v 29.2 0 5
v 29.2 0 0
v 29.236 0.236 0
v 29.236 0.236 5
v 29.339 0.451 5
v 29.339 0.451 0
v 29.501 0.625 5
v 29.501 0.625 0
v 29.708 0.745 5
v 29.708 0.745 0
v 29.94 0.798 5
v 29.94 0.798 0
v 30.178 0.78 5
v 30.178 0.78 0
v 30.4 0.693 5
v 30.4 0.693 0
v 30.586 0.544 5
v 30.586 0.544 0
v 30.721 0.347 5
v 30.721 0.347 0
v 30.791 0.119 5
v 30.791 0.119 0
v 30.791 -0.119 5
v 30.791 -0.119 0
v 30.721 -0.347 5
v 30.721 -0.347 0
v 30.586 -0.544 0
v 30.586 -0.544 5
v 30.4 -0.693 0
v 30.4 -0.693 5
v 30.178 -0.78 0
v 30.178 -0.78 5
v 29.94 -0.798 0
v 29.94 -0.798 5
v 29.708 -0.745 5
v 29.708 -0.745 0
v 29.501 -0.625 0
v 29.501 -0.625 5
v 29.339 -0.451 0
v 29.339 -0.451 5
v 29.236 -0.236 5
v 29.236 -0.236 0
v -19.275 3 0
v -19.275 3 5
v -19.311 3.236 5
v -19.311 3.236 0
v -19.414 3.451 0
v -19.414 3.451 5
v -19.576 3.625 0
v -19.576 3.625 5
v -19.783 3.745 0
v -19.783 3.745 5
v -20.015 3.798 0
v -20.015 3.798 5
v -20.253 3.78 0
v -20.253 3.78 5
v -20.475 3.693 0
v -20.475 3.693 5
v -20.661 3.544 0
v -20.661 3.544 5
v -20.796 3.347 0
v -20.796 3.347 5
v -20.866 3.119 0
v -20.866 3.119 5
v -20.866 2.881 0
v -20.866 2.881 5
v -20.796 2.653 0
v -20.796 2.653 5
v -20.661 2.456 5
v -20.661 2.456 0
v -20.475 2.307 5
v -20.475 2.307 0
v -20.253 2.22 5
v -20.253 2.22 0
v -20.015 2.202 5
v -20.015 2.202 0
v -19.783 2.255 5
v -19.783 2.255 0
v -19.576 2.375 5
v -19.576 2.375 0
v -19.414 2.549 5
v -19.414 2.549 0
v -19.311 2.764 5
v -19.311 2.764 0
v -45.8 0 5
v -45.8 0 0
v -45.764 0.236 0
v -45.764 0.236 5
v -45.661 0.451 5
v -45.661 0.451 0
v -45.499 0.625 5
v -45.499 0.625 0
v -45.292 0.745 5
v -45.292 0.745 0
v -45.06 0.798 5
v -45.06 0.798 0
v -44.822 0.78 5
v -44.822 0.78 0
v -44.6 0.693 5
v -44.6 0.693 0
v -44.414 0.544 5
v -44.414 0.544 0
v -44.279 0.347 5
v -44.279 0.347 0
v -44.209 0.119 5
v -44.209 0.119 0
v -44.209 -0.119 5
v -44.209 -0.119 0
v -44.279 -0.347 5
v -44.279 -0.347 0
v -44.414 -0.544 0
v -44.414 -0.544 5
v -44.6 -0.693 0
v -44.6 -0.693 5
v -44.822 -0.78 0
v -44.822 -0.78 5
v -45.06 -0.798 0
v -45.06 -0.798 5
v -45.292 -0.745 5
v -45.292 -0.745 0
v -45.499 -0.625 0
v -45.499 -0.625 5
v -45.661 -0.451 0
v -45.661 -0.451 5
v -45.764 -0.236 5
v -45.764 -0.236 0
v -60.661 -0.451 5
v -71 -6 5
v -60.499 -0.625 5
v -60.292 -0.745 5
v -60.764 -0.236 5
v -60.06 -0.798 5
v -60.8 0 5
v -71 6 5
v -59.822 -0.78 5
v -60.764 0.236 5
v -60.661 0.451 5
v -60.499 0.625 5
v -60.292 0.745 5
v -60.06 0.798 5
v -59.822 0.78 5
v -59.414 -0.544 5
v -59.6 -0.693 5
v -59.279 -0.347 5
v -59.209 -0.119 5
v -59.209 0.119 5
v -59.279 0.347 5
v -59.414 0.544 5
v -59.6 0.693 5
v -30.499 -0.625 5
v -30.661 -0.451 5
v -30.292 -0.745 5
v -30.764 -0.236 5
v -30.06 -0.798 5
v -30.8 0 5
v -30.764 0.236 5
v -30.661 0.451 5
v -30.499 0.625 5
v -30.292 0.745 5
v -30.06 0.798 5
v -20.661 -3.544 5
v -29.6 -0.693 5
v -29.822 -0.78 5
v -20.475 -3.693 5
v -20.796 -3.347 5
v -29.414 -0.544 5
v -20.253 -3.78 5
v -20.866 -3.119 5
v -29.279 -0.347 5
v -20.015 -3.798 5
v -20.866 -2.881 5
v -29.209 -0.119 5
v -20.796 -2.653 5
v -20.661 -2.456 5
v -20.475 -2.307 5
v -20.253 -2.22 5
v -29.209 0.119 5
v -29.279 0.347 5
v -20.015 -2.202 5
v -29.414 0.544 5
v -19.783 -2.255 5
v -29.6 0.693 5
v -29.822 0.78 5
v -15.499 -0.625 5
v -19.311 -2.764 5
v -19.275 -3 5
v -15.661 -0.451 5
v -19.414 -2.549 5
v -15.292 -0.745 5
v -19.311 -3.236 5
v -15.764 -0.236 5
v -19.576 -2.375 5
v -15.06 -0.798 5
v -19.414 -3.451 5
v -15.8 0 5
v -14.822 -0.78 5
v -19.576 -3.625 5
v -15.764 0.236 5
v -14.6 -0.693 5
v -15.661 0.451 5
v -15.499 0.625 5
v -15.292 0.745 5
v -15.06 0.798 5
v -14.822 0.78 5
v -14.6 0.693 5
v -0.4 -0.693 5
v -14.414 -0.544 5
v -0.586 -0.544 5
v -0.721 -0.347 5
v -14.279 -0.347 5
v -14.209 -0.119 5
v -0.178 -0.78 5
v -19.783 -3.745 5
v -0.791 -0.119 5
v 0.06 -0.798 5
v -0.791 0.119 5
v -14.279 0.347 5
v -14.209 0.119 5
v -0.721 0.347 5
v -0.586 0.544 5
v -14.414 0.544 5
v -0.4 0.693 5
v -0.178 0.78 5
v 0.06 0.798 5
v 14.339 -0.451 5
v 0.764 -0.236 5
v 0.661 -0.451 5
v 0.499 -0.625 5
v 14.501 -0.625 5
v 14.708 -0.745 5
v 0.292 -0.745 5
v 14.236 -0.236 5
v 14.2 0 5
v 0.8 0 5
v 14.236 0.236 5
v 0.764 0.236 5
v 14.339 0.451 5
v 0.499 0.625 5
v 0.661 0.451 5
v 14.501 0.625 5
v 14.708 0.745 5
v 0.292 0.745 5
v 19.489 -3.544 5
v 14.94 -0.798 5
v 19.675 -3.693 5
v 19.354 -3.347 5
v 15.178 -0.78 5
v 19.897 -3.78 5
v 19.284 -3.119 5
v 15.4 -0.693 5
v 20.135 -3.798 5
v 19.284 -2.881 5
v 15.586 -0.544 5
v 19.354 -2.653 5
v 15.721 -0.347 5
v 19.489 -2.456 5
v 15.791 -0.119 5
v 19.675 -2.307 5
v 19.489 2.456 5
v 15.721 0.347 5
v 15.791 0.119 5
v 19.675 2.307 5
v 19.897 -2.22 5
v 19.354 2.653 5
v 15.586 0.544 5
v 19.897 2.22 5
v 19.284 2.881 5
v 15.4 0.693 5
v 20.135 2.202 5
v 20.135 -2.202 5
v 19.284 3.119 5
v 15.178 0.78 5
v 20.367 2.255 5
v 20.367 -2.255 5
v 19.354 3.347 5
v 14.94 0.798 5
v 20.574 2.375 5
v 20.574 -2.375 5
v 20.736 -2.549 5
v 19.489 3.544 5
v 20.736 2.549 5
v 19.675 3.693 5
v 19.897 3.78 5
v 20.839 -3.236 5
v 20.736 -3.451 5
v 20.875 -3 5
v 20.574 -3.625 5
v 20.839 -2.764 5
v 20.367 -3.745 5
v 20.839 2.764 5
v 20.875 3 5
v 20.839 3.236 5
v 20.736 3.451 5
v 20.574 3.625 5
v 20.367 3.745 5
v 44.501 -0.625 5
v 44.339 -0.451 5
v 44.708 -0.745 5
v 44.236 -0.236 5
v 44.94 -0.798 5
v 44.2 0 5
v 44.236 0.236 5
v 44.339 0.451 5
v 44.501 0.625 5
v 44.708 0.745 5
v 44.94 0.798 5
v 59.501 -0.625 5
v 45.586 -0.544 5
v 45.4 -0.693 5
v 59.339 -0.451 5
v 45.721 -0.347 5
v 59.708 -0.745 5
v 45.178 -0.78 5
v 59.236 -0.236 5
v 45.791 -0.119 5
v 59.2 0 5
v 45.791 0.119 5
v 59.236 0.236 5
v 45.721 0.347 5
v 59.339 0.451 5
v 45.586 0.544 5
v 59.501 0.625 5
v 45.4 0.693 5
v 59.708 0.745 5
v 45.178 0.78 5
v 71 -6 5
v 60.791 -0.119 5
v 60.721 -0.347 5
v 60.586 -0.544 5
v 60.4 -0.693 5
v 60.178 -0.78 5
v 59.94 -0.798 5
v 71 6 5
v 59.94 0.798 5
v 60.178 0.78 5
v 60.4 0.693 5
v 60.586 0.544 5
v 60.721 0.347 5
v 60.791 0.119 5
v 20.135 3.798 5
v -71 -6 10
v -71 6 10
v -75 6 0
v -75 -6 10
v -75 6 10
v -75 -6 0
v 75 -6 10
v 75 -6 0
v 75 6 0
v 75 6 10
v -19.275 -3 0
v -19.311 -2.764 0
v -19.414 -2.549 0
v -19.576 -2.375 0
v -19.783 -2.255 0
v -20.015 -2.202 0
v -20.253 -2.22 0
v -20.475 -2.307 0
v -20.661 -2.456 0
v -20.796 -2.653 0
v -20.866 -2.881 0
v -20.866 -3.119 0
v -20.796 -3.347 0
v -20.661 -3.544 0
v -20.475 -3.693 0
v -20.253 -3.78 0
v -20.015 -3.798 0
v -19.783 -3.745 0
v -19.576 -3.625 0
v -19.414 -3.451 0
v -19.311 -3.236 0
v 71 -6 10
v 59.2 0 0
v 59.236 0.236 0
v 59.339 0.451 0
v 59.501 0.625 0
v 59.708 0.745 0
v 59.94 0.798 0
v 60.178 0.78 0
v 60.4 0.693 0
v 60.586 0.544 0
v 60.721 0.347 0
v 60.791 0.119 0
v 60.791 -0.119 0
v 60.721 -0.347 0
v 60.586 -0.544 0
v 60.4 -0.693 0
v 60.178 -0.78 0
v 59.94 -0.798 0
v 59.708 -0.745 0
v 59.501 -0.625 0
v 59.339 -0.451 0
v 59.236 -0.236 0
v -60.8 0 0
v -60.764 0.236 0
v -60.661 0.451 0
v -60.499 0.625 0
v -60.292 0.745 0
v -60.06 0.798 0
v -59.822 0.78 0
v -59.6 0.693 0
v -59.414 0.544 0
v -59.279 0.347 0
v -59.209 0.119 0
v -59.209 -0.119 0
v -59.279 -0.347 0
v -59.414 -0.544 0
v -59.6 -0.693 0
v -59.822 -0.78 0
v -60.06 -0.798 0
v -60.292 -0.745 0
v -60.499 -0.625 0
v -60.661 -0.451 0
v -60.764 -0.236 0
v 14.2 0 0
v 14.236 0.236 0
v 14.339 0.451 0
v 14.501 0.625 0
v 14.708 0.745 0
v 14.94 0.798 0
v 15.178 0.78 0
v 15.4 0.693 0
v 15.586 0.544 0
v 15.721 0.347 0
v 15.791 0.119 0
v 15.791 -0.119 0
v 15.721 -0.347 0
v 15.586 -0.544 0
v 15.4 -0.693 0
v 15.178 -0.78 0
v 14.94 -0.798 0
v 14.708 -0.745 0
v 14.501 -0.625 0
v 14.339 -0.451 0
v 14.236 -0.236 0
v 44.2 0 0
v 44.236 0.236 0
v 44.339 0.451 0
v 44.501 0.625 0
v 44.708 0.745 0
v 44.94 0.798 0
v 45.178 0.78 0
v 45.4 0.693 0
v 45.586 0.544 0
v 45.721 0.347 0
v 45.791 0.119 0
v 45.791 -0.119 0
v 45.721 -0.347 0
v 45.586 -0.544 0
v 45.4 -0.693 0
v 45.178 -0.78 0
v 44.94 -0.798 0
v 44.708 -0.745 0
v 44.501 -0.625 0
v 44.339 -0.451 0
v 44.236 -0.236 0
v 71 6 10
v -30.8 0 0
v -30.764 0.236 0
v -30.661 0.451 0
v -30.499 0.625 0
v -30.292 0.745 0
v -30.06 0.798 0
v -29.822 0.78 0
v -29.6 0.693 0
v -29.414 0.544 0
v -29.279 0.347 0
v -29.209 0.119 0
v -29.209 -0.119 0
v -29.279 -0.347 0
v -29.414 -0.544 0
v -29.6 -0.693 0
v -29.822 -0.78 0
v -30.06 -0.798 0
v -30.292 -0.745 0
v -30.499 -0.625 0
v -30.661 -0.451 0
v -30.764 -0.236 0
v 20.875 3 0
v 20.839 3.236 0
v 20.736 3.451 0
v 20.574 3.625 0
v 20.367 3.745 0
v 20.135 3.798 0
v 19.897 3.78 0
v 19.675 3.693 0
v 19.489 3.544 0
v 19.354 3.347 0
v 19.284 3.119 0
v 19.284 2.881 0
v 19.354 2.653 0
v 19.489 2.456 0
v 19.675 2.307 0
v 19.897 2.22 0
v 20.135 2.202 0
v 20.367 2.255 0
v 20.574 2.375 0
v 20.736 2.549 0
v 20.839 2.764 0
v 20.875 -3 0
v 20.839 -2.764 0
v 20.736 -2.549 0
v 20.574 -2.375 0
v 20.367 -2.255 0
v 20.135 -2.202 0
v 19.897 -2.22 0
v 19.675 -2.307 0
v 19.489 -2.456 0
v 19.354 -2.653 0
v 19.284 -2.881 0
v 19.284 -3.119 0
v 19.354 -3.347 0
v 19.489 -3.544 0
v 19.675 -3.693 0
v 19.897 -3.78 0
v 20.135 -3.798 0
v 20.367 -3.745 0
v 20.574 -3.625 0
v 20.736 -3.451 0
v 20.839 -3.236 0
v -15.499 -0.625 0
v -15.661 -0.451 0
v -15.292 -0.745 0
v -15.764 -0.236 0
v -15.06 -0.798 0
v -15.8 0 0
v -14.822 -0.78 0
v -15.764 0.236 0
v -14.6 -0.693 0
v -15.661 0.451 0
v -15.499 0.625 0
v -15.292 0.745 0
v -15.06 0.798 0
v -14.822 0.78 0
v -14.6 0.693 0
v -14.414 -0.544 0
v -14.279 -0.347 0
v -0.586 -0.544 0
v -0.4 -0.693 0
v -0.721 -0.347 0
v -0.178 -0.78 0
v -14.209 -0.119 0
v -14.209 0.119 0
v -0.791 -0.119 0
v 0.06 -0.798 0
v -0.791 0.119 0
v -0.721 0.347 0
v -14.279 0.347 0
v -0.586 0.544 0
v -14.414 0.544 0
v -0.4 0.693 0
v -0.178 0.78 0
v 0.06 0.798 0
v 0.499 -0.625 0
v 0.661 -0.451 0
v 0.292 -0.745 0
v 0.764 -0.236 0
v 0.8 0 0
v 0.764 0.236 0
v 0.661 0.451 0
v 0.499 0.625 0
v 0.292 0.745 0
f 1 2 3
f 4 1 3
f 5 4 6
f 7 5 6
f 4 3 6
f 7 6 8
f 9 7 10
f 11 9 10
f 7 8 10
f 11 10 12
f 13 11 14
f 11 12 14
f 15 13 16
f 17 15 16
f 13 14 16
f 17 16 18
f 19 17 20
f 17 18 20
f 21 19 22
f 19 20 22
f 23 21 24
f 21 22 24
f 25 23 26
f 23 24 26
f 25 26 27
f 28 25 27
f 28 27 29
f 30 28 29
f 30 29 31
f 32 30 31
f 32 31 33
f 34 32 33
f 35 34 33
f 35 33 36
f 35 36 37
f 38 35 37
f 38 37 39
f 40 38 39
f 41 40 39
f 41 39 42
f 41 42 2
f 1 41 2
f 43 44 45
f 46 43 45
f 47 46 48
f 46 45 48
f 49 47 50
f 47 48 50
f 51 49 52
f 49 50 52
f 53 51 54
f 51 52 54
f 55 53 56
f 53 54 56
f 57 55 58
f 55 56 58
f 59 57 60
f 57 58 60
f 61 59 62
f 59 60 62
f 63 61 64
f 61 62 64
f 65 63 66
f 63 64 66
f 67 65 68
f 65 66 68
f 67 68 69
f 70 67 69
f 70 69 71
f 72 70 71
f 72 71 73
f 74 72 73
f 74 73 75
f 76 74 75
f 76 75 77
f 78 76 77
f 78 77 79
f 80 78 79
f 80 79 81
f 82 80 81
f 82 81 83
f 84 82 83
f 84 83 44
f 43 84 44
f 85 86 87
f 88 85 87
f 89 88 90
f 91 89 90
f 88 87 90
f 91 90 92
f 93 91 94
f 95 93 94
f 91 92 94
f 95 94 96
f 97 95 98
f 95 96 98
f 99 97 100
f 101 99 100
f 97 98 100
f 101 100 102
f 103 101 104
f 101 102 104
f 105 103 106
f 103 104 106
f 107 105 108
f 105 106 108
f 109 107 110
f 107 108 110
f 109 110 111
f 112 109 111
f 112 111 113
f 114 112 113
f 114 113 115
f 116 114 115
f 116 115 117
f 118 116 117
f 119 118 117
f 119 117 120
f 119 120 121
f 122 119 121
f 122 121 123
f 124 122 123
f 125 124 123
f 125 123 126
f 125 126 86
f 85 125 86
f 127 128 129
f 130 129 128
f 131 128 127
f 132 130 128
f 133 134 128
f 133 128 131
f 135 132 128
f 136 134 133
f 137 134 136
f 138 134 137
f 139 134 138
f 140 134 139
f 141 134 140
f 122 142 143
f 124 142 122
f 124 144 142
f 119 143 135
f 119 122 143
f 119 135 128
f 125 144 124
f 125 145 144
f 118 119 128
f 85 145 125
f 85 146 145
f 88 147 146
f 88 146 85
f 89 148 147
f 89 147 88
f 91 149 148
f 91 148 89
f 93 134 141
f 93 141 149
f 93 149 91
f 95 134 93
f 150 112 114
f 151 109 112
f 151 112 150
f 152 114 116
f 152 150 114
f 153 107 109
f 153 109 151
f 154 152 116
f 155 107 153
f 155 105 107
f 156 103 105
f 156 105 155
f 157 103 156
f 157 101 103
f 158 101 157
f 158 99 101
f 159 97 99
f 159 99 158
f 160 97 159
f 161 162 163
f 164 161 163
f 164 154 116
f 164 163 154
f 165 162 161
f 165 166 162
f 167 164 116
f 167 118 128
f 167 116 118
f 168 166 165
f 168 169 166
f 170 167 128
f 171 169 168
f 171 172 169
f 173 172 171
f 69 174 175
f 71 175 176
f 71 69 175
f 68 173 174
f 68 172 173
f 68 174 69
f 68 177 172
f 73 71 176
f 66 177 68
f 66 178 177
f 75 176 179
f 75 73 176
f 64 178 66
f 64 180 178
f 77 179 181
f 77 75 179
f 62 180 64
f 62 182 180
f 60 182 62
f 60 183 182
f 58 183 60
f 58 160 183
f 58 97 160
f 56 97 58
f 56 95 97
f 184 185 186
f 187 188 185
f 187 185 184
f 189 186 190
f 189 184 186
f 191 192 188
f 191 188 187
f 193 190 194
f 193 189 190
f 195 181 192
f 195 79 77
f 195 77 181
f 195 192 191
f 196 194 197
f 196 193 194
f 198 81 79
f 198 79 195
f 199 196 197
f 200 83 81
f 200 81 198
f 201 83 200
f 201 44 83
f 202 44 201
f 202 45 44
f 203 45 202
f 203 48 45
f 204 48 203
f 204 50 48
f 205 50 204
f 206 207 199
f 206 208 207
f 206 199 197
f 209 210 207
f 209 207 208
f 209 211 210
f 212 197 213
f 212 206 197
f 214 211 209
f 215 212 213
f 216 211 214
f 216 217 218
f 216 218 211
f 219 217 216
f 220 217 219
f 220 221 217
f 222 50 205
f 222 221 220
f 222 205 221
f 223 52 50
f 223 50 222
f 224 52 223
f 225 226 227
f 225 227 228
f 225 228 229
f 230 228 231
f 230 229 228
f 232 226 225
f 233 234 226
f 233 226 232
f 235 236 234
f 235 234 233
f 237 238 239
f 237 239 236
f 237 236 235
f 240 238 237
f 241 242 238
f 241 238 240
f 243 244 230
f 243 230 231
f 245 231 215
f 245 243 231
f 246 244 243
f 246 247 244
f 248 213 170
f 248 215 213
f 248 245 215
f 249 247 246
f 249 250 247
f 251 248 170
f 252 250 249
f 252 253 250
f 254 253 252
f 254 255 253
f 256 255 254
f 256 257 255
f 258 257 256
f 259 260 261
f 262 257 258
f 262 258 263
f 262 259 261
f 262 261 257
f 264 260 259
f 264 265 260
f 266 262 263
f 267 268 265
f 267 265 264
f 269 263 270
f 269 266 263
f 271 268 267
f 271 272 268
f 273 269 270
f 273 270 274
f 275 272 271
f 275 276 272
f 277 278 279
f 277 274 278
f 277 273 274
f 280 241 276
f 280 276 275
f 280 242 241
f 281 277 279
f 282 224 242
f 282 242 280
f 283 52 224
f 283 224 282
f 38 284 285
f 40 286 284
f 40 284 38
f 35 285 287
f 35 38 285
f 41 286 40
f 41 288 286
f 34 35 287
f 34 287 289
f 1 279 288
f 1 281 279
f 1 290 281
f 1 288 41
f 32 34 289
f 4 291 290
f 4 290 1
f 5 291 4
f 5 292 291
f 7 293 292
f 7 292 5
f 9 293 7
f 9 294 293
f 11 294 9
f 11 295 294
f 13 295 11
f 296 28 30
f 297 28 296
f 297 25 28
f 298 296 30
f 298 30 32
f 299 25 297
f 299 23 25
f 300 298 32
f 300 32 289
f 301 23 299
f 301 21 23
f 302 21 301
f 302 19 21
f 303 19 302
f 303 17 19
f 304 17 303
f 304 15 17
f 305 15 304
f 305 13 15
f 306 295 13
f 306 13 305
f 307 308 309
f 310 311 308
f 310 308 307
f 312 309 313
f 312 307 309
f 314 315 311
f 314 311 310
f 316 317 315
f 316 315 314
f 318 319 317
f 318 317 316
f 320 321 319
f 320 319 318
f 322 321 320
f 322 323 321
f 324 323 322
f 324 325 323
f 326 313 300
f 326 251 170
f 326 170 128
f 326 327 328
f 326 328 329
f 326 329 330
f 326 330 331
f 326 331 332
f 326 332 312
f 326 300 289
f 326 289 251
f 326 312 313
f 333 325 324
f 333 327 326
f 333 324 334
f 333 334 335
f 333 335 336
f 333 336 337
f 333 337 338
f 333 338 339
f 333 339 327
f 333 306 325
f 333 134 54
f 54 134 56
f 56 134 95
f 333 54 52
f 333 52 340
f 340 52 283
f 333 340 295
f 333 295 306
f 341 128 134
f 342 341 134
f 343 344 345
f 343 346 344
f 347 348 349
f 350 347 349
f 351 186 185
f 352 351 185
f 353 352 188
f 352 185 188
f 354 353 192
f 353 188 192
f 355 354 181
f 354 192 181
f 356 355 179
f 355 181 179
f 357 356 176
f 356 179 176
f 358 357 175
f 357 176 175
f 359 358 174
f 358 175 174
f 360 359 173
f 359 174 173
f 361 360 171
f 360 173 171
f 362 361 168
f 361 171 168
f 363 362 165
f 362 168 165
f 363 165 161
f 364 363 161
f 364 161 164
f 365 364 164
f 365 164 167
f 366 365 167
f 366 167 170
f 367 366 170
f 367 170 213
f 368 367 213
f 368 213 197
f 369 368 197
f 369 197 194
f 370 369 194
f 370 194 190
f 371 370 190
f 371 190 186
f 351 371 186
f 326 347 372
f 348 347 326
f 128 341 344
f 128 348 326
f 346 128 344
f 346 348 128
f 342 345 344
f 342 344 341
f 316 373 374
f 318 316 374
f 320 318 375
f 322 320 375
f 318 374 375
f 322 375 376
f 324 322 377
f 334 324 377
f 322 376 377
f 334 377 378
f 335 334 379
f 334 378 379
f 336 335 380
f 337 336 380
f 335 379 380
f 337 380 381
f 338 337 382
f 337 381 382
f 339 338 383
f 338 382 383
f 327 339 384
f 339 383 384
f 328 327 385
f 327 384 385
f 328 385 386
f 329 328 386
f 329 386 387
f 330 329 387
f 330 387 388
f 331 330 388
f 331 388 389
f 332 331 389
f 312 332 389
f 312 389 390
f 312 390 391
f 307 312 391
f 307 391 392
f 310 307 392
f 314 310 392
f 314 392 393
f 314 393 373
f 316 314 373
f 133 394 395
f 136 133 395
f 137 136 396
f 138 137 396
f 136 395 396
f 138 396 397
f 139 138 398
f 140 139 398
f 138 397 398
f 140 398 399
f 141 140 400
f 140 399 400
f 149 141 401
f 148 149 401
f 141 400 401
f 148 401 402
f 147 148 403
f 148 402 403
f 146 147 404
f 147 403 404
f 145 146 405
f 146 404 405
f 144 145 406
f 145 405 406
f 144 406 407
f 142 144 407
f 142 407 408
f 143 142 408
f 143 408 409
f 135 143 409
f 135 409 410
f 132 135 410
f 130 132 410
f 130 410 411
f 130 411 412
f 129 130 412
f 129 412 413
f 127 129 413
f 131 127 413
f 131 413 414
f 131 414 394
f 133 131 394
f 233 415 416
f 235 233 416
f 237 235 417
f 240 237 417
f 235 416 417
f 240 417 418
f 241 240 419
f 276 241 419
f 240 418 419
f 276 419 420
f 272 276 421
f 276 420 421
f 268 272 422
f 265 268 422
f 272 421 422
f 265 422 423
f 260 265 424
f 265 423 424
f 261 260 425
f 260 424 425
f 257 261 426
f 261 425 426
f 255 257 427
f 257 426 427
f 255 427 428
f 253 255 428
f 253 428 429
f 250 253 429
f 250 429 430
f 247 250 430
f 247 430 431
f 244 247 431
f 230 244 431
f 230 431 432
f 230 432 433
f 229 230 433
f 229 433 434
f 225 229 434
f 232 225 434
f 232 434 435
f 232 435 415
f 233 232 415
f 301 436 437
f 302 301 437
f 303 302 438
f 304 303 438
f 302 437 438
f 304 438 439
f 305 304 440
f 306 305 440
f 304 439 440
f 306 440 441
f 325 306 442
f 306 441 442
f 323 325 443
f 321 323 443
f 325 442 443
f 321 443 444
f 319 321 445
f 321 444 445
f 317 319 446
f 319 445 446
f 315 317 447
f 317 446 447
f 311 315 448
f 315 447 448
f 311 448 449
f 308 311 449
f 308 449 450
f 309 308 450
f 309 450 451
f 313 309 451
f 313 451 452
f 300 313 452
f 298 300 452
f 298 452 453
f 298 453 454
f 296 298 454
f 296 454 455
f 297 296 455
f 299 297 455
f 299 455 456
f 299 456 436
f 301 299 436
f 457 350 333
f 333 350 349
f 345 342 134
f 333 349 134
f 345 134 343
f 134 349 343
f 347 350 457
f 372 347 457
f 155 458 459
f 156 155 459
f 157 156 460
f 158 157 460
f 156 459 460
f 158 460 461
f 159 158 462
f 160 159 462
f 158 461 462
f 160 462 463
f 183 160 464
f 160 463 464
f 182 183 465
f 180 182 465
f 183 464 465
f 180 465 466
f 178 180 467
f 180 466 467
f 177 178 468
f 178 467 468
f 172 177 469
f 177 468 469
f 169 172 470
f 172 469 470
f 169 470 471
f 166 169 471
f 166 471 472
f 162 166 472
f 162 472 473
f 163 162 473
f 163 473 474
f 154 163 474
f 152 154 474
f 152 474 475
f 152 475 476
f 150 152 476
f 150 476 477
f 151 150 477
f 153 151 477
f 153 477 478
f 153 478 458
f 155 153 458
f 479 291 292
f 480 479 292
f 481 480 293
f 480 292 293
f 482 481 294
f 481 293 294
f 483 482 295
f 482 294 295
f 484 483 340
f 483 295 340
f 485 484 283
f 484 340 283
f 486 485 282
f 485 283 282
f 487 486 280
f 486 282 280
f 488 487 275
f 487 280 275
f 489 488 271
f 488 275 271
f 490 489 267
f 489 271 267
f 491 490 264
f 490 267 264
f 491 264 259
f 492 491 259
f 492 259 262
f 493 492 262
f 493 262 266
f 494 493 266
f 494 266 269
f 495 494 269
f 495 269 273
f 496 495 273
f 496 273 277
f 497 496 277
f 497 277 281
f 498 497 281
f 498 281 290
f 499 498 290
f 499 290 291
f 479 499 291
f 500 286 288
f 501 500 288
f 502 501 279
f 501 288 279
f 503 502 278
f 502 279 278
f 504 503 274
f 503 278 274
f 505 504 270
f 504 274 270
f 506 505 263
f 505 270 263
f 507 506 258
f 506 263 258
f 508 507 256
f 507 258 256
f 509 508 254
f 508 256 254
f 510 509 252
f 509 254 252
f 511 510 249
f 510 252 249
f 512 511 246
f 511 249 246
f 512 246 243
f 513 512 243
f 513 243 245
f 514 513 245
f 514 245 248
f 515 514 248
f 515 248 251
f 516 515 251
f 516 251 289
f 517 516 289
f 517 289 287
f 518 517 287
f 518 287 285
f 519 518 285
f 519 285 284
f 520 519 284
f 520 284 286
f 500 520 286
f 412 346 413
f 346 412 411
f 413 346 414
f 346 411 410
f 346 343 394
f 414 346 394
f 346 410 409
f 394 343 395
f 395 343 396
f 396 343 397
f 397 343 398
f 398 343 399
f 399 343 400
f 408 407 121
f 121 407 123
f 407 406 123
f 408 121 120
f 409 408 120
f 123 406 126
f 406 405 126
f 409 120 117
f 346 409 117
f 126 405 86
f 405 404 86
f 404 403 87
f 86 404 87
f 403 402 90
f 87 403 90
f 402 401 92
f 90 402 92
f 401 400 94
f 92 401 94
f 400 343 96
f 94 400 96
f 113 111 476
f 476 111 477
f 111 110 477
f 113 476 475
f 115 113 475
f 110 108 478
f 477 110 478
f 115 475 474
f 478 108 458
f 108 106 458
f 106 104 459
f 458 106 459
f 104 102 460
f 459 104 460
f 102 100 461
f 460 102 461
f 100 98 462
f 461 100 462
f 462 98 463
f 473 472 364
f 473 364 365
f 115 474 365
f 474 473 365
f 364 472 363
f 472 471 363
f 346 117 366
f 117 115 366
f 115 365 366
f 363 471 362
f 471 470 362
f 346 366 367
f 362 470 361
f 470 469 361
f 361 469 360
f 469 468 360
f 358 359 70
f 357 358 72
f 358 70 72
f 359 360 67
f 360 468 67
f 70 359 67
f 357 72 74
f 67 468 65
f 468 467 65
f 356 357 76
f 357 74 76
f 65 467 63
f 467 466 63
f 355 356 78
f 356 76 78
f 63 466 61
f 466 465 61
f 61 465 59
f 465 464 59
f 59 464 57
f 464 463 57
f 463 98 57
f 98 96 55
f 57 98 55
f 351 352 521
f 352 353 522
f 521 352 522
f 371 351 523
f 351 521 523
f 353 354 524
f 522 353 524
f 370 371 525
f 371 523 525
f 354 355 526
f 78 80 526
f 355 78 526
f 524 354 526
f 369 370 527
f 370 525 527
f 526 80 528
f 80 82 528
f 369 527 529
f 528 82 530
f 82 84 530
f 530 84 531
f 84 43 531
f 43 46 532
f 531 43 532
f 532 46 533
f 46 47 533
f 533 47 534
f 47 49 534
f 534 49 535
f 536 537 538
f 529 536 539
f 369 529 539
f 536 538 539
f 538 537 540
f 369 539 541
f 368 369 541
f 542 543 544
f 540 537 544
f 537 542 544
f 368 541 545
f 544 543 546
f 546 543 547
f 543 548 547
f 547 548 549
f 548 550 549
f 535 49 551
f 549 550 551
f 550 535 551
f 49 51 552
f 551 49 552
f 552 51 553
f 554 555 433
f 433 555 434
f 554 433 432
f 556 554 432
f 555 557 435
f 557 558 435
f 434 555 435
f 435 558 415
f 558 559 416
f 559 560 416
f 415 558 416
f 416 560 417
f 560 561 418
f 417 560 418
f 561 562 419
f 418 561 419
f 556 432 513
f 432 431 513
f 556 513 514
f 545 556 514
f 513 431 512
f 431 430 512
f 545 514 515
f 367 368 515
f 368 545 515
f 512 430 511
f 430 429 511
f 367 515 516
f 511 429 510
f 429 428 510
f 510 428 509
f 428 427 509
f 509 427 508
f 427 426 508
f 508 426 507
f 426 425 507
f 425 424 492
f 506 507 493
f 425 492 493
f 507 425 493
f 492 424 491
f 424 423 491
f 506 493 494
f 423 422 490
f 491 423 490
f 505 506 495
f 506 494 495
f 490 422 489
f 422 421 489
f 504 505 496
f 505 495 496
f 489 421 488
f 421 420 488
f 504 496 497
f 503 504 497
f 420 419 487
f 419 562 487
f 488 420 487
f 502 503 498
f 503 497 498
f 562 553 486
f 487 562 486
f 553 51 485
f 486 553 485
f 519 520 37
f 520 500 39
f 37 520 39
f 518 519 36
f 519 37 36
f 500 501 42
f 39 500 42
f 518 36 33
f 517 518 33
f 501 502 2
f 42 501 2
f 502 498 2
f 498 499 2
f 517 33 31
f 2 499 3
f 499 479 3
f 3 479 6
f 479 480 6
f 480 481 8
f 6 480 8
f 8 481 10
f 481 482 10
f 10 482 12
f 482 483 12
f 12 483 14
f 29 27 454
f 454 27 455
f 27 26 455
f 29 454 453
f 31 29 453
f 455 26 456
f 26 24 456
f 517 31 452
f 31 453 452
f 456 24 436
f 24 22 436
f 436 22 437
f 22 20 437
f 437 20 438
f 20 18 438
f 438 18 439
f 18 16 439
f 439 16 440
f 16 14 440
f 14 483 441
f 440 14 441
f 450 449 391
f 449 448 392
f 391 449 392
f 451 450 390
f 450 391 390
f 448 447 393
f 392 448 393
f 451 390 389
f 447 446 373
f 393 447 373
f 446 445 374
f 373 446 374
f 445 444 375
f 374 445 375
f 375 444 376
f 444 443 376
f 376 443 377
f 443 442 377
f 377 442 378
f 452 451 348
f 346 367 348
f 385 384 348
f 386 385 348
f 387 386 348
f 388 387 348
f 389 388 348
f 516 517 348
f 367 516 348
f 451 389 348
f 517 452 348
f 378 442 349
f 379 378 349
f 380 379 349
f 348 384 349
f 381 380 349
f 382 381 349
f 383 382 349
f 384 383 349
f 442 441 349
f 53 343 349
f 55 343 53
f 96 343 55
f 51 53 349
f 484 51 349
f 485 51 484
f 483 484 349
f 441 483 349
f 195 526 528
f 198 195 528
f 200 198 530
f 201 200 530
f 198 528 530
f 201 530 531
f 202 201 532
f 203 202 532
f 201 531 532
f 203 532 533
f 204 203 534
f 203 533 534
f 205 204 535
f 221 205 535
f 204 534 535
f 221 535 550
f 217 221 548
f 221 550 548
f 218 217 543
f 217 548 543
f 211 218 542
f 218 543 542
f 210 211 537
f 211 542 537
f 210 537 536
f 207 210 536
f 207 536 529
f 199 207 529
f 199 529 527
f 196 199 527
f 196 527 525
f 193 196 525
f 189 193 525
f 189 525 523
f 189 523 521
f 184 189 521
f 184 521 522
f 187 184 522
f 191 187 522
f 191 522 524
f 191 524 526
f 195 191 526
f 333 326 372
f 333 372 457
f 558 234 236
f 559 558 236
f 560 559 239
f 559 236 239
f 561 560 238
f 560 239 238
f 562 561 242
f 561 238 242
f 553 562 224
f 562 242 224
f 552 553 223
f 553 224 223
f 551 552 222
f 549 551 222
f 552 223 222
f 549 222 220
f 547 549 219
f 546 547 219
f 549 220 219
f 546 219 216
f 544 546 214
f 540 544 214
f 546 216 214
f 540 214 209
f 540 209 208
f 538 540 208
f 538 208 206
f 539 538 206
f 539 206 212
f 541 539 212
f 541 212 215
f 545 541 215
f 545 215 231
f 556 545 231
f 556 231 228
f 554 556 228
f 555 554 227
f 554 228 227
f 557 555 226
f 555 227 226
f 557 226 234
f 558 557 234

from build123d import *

# Parameters (mm, degrees)
SKETCH_1_W             = 150
SKETCH_1_H             = 12
EXTRUDE_1_DEPTH        = 5
SKETCH_2_W             = 4
SKETCH_2_H             = 12
EXTRUDE_2_DEPTH        = 5
HOLE_WIZARD_M2_2_D     = 1.6
HOLE_WIZARD_M2_2_DEPTH = 5.2
HOLE_WIZARD_M2_2_TIP   = 0.480688495
HOLE_WIZARD_M2_3_D     = 1.6
HOLE_WIZARD_M2_4_D     = 1.6


with BuildPart() as part:
    # 草图1 → 凸台-拉伸1 (new body)
    with BuildSketch(Plane.XY):
        Rectangle(SKETCH_1_W, SKETCH_1_H)
    extrude(amount=EXTRUDE_1_DEPTH)

    # 草图2 → 凸台-拉伸2 (add)
    with BuildSketch(Plane.XY.offset(5)):
        with Locations((-73, 0)):
            Rectangle(SKETCH_2_W, SKETCH_2_H)
    extrude_2 = extrude(amount=EXTRUDE_2_DEPTH)

    # 镜向1: 凸台-拉伸2 across plane
    add(extrude_2.mirror(Plane(origin=(0, 0, 0), x_dir=(0, 0, 1), z_dir=(1, 0, 0))))

    # M2 螺纹孔2
    with Locations(Plane(origin=(0, 0, 0), x_dir=(-1, 0, 0), z_dir=(0, 0, -1))):
        with Locations((-20.075, -3), (-20.075, 3), (20.075, -3), (20.075, 3)):
            Hole(HOLE_WIZARD_M2_2_D / 2, depth=HOLE_WIZARD_M2_2_DEPTH)
            with Locations((0, 0, -(HOLE_WIZARD_M2_2_DEPTH + HOLE_WIZARD_M2_2_TIP / 2))):  # 118° drill point
                Cone(0, HOLE_WIZARD_M2_2_D / 2, HOLE_WIZARD_M2_2_TIP, mode=Mode.SUBTRACT)

    # M2 螺纹孔3 (through all)
    with Locations(Plane(origin=(0, 0, 0), x_dir=(-1, 0, 0), z_dir=(0, 0, -1))):
        with Locations((0, 0)):
            Hole(HOLE_WIZARD_M2_3_D / 2)

    # M2 螺纹孔4 (through all)
    with Locations(Plane.XY.offset(5)):
        with Locations((0, 0), (15, 0), (30, 0), (-30, 0), (-45, 0), (-60, 0), (-15, 0), (45, 0), (60, 0)):
            Hole(HOLE_WIZARD_M2_4_D / 2)


solid = part.part
